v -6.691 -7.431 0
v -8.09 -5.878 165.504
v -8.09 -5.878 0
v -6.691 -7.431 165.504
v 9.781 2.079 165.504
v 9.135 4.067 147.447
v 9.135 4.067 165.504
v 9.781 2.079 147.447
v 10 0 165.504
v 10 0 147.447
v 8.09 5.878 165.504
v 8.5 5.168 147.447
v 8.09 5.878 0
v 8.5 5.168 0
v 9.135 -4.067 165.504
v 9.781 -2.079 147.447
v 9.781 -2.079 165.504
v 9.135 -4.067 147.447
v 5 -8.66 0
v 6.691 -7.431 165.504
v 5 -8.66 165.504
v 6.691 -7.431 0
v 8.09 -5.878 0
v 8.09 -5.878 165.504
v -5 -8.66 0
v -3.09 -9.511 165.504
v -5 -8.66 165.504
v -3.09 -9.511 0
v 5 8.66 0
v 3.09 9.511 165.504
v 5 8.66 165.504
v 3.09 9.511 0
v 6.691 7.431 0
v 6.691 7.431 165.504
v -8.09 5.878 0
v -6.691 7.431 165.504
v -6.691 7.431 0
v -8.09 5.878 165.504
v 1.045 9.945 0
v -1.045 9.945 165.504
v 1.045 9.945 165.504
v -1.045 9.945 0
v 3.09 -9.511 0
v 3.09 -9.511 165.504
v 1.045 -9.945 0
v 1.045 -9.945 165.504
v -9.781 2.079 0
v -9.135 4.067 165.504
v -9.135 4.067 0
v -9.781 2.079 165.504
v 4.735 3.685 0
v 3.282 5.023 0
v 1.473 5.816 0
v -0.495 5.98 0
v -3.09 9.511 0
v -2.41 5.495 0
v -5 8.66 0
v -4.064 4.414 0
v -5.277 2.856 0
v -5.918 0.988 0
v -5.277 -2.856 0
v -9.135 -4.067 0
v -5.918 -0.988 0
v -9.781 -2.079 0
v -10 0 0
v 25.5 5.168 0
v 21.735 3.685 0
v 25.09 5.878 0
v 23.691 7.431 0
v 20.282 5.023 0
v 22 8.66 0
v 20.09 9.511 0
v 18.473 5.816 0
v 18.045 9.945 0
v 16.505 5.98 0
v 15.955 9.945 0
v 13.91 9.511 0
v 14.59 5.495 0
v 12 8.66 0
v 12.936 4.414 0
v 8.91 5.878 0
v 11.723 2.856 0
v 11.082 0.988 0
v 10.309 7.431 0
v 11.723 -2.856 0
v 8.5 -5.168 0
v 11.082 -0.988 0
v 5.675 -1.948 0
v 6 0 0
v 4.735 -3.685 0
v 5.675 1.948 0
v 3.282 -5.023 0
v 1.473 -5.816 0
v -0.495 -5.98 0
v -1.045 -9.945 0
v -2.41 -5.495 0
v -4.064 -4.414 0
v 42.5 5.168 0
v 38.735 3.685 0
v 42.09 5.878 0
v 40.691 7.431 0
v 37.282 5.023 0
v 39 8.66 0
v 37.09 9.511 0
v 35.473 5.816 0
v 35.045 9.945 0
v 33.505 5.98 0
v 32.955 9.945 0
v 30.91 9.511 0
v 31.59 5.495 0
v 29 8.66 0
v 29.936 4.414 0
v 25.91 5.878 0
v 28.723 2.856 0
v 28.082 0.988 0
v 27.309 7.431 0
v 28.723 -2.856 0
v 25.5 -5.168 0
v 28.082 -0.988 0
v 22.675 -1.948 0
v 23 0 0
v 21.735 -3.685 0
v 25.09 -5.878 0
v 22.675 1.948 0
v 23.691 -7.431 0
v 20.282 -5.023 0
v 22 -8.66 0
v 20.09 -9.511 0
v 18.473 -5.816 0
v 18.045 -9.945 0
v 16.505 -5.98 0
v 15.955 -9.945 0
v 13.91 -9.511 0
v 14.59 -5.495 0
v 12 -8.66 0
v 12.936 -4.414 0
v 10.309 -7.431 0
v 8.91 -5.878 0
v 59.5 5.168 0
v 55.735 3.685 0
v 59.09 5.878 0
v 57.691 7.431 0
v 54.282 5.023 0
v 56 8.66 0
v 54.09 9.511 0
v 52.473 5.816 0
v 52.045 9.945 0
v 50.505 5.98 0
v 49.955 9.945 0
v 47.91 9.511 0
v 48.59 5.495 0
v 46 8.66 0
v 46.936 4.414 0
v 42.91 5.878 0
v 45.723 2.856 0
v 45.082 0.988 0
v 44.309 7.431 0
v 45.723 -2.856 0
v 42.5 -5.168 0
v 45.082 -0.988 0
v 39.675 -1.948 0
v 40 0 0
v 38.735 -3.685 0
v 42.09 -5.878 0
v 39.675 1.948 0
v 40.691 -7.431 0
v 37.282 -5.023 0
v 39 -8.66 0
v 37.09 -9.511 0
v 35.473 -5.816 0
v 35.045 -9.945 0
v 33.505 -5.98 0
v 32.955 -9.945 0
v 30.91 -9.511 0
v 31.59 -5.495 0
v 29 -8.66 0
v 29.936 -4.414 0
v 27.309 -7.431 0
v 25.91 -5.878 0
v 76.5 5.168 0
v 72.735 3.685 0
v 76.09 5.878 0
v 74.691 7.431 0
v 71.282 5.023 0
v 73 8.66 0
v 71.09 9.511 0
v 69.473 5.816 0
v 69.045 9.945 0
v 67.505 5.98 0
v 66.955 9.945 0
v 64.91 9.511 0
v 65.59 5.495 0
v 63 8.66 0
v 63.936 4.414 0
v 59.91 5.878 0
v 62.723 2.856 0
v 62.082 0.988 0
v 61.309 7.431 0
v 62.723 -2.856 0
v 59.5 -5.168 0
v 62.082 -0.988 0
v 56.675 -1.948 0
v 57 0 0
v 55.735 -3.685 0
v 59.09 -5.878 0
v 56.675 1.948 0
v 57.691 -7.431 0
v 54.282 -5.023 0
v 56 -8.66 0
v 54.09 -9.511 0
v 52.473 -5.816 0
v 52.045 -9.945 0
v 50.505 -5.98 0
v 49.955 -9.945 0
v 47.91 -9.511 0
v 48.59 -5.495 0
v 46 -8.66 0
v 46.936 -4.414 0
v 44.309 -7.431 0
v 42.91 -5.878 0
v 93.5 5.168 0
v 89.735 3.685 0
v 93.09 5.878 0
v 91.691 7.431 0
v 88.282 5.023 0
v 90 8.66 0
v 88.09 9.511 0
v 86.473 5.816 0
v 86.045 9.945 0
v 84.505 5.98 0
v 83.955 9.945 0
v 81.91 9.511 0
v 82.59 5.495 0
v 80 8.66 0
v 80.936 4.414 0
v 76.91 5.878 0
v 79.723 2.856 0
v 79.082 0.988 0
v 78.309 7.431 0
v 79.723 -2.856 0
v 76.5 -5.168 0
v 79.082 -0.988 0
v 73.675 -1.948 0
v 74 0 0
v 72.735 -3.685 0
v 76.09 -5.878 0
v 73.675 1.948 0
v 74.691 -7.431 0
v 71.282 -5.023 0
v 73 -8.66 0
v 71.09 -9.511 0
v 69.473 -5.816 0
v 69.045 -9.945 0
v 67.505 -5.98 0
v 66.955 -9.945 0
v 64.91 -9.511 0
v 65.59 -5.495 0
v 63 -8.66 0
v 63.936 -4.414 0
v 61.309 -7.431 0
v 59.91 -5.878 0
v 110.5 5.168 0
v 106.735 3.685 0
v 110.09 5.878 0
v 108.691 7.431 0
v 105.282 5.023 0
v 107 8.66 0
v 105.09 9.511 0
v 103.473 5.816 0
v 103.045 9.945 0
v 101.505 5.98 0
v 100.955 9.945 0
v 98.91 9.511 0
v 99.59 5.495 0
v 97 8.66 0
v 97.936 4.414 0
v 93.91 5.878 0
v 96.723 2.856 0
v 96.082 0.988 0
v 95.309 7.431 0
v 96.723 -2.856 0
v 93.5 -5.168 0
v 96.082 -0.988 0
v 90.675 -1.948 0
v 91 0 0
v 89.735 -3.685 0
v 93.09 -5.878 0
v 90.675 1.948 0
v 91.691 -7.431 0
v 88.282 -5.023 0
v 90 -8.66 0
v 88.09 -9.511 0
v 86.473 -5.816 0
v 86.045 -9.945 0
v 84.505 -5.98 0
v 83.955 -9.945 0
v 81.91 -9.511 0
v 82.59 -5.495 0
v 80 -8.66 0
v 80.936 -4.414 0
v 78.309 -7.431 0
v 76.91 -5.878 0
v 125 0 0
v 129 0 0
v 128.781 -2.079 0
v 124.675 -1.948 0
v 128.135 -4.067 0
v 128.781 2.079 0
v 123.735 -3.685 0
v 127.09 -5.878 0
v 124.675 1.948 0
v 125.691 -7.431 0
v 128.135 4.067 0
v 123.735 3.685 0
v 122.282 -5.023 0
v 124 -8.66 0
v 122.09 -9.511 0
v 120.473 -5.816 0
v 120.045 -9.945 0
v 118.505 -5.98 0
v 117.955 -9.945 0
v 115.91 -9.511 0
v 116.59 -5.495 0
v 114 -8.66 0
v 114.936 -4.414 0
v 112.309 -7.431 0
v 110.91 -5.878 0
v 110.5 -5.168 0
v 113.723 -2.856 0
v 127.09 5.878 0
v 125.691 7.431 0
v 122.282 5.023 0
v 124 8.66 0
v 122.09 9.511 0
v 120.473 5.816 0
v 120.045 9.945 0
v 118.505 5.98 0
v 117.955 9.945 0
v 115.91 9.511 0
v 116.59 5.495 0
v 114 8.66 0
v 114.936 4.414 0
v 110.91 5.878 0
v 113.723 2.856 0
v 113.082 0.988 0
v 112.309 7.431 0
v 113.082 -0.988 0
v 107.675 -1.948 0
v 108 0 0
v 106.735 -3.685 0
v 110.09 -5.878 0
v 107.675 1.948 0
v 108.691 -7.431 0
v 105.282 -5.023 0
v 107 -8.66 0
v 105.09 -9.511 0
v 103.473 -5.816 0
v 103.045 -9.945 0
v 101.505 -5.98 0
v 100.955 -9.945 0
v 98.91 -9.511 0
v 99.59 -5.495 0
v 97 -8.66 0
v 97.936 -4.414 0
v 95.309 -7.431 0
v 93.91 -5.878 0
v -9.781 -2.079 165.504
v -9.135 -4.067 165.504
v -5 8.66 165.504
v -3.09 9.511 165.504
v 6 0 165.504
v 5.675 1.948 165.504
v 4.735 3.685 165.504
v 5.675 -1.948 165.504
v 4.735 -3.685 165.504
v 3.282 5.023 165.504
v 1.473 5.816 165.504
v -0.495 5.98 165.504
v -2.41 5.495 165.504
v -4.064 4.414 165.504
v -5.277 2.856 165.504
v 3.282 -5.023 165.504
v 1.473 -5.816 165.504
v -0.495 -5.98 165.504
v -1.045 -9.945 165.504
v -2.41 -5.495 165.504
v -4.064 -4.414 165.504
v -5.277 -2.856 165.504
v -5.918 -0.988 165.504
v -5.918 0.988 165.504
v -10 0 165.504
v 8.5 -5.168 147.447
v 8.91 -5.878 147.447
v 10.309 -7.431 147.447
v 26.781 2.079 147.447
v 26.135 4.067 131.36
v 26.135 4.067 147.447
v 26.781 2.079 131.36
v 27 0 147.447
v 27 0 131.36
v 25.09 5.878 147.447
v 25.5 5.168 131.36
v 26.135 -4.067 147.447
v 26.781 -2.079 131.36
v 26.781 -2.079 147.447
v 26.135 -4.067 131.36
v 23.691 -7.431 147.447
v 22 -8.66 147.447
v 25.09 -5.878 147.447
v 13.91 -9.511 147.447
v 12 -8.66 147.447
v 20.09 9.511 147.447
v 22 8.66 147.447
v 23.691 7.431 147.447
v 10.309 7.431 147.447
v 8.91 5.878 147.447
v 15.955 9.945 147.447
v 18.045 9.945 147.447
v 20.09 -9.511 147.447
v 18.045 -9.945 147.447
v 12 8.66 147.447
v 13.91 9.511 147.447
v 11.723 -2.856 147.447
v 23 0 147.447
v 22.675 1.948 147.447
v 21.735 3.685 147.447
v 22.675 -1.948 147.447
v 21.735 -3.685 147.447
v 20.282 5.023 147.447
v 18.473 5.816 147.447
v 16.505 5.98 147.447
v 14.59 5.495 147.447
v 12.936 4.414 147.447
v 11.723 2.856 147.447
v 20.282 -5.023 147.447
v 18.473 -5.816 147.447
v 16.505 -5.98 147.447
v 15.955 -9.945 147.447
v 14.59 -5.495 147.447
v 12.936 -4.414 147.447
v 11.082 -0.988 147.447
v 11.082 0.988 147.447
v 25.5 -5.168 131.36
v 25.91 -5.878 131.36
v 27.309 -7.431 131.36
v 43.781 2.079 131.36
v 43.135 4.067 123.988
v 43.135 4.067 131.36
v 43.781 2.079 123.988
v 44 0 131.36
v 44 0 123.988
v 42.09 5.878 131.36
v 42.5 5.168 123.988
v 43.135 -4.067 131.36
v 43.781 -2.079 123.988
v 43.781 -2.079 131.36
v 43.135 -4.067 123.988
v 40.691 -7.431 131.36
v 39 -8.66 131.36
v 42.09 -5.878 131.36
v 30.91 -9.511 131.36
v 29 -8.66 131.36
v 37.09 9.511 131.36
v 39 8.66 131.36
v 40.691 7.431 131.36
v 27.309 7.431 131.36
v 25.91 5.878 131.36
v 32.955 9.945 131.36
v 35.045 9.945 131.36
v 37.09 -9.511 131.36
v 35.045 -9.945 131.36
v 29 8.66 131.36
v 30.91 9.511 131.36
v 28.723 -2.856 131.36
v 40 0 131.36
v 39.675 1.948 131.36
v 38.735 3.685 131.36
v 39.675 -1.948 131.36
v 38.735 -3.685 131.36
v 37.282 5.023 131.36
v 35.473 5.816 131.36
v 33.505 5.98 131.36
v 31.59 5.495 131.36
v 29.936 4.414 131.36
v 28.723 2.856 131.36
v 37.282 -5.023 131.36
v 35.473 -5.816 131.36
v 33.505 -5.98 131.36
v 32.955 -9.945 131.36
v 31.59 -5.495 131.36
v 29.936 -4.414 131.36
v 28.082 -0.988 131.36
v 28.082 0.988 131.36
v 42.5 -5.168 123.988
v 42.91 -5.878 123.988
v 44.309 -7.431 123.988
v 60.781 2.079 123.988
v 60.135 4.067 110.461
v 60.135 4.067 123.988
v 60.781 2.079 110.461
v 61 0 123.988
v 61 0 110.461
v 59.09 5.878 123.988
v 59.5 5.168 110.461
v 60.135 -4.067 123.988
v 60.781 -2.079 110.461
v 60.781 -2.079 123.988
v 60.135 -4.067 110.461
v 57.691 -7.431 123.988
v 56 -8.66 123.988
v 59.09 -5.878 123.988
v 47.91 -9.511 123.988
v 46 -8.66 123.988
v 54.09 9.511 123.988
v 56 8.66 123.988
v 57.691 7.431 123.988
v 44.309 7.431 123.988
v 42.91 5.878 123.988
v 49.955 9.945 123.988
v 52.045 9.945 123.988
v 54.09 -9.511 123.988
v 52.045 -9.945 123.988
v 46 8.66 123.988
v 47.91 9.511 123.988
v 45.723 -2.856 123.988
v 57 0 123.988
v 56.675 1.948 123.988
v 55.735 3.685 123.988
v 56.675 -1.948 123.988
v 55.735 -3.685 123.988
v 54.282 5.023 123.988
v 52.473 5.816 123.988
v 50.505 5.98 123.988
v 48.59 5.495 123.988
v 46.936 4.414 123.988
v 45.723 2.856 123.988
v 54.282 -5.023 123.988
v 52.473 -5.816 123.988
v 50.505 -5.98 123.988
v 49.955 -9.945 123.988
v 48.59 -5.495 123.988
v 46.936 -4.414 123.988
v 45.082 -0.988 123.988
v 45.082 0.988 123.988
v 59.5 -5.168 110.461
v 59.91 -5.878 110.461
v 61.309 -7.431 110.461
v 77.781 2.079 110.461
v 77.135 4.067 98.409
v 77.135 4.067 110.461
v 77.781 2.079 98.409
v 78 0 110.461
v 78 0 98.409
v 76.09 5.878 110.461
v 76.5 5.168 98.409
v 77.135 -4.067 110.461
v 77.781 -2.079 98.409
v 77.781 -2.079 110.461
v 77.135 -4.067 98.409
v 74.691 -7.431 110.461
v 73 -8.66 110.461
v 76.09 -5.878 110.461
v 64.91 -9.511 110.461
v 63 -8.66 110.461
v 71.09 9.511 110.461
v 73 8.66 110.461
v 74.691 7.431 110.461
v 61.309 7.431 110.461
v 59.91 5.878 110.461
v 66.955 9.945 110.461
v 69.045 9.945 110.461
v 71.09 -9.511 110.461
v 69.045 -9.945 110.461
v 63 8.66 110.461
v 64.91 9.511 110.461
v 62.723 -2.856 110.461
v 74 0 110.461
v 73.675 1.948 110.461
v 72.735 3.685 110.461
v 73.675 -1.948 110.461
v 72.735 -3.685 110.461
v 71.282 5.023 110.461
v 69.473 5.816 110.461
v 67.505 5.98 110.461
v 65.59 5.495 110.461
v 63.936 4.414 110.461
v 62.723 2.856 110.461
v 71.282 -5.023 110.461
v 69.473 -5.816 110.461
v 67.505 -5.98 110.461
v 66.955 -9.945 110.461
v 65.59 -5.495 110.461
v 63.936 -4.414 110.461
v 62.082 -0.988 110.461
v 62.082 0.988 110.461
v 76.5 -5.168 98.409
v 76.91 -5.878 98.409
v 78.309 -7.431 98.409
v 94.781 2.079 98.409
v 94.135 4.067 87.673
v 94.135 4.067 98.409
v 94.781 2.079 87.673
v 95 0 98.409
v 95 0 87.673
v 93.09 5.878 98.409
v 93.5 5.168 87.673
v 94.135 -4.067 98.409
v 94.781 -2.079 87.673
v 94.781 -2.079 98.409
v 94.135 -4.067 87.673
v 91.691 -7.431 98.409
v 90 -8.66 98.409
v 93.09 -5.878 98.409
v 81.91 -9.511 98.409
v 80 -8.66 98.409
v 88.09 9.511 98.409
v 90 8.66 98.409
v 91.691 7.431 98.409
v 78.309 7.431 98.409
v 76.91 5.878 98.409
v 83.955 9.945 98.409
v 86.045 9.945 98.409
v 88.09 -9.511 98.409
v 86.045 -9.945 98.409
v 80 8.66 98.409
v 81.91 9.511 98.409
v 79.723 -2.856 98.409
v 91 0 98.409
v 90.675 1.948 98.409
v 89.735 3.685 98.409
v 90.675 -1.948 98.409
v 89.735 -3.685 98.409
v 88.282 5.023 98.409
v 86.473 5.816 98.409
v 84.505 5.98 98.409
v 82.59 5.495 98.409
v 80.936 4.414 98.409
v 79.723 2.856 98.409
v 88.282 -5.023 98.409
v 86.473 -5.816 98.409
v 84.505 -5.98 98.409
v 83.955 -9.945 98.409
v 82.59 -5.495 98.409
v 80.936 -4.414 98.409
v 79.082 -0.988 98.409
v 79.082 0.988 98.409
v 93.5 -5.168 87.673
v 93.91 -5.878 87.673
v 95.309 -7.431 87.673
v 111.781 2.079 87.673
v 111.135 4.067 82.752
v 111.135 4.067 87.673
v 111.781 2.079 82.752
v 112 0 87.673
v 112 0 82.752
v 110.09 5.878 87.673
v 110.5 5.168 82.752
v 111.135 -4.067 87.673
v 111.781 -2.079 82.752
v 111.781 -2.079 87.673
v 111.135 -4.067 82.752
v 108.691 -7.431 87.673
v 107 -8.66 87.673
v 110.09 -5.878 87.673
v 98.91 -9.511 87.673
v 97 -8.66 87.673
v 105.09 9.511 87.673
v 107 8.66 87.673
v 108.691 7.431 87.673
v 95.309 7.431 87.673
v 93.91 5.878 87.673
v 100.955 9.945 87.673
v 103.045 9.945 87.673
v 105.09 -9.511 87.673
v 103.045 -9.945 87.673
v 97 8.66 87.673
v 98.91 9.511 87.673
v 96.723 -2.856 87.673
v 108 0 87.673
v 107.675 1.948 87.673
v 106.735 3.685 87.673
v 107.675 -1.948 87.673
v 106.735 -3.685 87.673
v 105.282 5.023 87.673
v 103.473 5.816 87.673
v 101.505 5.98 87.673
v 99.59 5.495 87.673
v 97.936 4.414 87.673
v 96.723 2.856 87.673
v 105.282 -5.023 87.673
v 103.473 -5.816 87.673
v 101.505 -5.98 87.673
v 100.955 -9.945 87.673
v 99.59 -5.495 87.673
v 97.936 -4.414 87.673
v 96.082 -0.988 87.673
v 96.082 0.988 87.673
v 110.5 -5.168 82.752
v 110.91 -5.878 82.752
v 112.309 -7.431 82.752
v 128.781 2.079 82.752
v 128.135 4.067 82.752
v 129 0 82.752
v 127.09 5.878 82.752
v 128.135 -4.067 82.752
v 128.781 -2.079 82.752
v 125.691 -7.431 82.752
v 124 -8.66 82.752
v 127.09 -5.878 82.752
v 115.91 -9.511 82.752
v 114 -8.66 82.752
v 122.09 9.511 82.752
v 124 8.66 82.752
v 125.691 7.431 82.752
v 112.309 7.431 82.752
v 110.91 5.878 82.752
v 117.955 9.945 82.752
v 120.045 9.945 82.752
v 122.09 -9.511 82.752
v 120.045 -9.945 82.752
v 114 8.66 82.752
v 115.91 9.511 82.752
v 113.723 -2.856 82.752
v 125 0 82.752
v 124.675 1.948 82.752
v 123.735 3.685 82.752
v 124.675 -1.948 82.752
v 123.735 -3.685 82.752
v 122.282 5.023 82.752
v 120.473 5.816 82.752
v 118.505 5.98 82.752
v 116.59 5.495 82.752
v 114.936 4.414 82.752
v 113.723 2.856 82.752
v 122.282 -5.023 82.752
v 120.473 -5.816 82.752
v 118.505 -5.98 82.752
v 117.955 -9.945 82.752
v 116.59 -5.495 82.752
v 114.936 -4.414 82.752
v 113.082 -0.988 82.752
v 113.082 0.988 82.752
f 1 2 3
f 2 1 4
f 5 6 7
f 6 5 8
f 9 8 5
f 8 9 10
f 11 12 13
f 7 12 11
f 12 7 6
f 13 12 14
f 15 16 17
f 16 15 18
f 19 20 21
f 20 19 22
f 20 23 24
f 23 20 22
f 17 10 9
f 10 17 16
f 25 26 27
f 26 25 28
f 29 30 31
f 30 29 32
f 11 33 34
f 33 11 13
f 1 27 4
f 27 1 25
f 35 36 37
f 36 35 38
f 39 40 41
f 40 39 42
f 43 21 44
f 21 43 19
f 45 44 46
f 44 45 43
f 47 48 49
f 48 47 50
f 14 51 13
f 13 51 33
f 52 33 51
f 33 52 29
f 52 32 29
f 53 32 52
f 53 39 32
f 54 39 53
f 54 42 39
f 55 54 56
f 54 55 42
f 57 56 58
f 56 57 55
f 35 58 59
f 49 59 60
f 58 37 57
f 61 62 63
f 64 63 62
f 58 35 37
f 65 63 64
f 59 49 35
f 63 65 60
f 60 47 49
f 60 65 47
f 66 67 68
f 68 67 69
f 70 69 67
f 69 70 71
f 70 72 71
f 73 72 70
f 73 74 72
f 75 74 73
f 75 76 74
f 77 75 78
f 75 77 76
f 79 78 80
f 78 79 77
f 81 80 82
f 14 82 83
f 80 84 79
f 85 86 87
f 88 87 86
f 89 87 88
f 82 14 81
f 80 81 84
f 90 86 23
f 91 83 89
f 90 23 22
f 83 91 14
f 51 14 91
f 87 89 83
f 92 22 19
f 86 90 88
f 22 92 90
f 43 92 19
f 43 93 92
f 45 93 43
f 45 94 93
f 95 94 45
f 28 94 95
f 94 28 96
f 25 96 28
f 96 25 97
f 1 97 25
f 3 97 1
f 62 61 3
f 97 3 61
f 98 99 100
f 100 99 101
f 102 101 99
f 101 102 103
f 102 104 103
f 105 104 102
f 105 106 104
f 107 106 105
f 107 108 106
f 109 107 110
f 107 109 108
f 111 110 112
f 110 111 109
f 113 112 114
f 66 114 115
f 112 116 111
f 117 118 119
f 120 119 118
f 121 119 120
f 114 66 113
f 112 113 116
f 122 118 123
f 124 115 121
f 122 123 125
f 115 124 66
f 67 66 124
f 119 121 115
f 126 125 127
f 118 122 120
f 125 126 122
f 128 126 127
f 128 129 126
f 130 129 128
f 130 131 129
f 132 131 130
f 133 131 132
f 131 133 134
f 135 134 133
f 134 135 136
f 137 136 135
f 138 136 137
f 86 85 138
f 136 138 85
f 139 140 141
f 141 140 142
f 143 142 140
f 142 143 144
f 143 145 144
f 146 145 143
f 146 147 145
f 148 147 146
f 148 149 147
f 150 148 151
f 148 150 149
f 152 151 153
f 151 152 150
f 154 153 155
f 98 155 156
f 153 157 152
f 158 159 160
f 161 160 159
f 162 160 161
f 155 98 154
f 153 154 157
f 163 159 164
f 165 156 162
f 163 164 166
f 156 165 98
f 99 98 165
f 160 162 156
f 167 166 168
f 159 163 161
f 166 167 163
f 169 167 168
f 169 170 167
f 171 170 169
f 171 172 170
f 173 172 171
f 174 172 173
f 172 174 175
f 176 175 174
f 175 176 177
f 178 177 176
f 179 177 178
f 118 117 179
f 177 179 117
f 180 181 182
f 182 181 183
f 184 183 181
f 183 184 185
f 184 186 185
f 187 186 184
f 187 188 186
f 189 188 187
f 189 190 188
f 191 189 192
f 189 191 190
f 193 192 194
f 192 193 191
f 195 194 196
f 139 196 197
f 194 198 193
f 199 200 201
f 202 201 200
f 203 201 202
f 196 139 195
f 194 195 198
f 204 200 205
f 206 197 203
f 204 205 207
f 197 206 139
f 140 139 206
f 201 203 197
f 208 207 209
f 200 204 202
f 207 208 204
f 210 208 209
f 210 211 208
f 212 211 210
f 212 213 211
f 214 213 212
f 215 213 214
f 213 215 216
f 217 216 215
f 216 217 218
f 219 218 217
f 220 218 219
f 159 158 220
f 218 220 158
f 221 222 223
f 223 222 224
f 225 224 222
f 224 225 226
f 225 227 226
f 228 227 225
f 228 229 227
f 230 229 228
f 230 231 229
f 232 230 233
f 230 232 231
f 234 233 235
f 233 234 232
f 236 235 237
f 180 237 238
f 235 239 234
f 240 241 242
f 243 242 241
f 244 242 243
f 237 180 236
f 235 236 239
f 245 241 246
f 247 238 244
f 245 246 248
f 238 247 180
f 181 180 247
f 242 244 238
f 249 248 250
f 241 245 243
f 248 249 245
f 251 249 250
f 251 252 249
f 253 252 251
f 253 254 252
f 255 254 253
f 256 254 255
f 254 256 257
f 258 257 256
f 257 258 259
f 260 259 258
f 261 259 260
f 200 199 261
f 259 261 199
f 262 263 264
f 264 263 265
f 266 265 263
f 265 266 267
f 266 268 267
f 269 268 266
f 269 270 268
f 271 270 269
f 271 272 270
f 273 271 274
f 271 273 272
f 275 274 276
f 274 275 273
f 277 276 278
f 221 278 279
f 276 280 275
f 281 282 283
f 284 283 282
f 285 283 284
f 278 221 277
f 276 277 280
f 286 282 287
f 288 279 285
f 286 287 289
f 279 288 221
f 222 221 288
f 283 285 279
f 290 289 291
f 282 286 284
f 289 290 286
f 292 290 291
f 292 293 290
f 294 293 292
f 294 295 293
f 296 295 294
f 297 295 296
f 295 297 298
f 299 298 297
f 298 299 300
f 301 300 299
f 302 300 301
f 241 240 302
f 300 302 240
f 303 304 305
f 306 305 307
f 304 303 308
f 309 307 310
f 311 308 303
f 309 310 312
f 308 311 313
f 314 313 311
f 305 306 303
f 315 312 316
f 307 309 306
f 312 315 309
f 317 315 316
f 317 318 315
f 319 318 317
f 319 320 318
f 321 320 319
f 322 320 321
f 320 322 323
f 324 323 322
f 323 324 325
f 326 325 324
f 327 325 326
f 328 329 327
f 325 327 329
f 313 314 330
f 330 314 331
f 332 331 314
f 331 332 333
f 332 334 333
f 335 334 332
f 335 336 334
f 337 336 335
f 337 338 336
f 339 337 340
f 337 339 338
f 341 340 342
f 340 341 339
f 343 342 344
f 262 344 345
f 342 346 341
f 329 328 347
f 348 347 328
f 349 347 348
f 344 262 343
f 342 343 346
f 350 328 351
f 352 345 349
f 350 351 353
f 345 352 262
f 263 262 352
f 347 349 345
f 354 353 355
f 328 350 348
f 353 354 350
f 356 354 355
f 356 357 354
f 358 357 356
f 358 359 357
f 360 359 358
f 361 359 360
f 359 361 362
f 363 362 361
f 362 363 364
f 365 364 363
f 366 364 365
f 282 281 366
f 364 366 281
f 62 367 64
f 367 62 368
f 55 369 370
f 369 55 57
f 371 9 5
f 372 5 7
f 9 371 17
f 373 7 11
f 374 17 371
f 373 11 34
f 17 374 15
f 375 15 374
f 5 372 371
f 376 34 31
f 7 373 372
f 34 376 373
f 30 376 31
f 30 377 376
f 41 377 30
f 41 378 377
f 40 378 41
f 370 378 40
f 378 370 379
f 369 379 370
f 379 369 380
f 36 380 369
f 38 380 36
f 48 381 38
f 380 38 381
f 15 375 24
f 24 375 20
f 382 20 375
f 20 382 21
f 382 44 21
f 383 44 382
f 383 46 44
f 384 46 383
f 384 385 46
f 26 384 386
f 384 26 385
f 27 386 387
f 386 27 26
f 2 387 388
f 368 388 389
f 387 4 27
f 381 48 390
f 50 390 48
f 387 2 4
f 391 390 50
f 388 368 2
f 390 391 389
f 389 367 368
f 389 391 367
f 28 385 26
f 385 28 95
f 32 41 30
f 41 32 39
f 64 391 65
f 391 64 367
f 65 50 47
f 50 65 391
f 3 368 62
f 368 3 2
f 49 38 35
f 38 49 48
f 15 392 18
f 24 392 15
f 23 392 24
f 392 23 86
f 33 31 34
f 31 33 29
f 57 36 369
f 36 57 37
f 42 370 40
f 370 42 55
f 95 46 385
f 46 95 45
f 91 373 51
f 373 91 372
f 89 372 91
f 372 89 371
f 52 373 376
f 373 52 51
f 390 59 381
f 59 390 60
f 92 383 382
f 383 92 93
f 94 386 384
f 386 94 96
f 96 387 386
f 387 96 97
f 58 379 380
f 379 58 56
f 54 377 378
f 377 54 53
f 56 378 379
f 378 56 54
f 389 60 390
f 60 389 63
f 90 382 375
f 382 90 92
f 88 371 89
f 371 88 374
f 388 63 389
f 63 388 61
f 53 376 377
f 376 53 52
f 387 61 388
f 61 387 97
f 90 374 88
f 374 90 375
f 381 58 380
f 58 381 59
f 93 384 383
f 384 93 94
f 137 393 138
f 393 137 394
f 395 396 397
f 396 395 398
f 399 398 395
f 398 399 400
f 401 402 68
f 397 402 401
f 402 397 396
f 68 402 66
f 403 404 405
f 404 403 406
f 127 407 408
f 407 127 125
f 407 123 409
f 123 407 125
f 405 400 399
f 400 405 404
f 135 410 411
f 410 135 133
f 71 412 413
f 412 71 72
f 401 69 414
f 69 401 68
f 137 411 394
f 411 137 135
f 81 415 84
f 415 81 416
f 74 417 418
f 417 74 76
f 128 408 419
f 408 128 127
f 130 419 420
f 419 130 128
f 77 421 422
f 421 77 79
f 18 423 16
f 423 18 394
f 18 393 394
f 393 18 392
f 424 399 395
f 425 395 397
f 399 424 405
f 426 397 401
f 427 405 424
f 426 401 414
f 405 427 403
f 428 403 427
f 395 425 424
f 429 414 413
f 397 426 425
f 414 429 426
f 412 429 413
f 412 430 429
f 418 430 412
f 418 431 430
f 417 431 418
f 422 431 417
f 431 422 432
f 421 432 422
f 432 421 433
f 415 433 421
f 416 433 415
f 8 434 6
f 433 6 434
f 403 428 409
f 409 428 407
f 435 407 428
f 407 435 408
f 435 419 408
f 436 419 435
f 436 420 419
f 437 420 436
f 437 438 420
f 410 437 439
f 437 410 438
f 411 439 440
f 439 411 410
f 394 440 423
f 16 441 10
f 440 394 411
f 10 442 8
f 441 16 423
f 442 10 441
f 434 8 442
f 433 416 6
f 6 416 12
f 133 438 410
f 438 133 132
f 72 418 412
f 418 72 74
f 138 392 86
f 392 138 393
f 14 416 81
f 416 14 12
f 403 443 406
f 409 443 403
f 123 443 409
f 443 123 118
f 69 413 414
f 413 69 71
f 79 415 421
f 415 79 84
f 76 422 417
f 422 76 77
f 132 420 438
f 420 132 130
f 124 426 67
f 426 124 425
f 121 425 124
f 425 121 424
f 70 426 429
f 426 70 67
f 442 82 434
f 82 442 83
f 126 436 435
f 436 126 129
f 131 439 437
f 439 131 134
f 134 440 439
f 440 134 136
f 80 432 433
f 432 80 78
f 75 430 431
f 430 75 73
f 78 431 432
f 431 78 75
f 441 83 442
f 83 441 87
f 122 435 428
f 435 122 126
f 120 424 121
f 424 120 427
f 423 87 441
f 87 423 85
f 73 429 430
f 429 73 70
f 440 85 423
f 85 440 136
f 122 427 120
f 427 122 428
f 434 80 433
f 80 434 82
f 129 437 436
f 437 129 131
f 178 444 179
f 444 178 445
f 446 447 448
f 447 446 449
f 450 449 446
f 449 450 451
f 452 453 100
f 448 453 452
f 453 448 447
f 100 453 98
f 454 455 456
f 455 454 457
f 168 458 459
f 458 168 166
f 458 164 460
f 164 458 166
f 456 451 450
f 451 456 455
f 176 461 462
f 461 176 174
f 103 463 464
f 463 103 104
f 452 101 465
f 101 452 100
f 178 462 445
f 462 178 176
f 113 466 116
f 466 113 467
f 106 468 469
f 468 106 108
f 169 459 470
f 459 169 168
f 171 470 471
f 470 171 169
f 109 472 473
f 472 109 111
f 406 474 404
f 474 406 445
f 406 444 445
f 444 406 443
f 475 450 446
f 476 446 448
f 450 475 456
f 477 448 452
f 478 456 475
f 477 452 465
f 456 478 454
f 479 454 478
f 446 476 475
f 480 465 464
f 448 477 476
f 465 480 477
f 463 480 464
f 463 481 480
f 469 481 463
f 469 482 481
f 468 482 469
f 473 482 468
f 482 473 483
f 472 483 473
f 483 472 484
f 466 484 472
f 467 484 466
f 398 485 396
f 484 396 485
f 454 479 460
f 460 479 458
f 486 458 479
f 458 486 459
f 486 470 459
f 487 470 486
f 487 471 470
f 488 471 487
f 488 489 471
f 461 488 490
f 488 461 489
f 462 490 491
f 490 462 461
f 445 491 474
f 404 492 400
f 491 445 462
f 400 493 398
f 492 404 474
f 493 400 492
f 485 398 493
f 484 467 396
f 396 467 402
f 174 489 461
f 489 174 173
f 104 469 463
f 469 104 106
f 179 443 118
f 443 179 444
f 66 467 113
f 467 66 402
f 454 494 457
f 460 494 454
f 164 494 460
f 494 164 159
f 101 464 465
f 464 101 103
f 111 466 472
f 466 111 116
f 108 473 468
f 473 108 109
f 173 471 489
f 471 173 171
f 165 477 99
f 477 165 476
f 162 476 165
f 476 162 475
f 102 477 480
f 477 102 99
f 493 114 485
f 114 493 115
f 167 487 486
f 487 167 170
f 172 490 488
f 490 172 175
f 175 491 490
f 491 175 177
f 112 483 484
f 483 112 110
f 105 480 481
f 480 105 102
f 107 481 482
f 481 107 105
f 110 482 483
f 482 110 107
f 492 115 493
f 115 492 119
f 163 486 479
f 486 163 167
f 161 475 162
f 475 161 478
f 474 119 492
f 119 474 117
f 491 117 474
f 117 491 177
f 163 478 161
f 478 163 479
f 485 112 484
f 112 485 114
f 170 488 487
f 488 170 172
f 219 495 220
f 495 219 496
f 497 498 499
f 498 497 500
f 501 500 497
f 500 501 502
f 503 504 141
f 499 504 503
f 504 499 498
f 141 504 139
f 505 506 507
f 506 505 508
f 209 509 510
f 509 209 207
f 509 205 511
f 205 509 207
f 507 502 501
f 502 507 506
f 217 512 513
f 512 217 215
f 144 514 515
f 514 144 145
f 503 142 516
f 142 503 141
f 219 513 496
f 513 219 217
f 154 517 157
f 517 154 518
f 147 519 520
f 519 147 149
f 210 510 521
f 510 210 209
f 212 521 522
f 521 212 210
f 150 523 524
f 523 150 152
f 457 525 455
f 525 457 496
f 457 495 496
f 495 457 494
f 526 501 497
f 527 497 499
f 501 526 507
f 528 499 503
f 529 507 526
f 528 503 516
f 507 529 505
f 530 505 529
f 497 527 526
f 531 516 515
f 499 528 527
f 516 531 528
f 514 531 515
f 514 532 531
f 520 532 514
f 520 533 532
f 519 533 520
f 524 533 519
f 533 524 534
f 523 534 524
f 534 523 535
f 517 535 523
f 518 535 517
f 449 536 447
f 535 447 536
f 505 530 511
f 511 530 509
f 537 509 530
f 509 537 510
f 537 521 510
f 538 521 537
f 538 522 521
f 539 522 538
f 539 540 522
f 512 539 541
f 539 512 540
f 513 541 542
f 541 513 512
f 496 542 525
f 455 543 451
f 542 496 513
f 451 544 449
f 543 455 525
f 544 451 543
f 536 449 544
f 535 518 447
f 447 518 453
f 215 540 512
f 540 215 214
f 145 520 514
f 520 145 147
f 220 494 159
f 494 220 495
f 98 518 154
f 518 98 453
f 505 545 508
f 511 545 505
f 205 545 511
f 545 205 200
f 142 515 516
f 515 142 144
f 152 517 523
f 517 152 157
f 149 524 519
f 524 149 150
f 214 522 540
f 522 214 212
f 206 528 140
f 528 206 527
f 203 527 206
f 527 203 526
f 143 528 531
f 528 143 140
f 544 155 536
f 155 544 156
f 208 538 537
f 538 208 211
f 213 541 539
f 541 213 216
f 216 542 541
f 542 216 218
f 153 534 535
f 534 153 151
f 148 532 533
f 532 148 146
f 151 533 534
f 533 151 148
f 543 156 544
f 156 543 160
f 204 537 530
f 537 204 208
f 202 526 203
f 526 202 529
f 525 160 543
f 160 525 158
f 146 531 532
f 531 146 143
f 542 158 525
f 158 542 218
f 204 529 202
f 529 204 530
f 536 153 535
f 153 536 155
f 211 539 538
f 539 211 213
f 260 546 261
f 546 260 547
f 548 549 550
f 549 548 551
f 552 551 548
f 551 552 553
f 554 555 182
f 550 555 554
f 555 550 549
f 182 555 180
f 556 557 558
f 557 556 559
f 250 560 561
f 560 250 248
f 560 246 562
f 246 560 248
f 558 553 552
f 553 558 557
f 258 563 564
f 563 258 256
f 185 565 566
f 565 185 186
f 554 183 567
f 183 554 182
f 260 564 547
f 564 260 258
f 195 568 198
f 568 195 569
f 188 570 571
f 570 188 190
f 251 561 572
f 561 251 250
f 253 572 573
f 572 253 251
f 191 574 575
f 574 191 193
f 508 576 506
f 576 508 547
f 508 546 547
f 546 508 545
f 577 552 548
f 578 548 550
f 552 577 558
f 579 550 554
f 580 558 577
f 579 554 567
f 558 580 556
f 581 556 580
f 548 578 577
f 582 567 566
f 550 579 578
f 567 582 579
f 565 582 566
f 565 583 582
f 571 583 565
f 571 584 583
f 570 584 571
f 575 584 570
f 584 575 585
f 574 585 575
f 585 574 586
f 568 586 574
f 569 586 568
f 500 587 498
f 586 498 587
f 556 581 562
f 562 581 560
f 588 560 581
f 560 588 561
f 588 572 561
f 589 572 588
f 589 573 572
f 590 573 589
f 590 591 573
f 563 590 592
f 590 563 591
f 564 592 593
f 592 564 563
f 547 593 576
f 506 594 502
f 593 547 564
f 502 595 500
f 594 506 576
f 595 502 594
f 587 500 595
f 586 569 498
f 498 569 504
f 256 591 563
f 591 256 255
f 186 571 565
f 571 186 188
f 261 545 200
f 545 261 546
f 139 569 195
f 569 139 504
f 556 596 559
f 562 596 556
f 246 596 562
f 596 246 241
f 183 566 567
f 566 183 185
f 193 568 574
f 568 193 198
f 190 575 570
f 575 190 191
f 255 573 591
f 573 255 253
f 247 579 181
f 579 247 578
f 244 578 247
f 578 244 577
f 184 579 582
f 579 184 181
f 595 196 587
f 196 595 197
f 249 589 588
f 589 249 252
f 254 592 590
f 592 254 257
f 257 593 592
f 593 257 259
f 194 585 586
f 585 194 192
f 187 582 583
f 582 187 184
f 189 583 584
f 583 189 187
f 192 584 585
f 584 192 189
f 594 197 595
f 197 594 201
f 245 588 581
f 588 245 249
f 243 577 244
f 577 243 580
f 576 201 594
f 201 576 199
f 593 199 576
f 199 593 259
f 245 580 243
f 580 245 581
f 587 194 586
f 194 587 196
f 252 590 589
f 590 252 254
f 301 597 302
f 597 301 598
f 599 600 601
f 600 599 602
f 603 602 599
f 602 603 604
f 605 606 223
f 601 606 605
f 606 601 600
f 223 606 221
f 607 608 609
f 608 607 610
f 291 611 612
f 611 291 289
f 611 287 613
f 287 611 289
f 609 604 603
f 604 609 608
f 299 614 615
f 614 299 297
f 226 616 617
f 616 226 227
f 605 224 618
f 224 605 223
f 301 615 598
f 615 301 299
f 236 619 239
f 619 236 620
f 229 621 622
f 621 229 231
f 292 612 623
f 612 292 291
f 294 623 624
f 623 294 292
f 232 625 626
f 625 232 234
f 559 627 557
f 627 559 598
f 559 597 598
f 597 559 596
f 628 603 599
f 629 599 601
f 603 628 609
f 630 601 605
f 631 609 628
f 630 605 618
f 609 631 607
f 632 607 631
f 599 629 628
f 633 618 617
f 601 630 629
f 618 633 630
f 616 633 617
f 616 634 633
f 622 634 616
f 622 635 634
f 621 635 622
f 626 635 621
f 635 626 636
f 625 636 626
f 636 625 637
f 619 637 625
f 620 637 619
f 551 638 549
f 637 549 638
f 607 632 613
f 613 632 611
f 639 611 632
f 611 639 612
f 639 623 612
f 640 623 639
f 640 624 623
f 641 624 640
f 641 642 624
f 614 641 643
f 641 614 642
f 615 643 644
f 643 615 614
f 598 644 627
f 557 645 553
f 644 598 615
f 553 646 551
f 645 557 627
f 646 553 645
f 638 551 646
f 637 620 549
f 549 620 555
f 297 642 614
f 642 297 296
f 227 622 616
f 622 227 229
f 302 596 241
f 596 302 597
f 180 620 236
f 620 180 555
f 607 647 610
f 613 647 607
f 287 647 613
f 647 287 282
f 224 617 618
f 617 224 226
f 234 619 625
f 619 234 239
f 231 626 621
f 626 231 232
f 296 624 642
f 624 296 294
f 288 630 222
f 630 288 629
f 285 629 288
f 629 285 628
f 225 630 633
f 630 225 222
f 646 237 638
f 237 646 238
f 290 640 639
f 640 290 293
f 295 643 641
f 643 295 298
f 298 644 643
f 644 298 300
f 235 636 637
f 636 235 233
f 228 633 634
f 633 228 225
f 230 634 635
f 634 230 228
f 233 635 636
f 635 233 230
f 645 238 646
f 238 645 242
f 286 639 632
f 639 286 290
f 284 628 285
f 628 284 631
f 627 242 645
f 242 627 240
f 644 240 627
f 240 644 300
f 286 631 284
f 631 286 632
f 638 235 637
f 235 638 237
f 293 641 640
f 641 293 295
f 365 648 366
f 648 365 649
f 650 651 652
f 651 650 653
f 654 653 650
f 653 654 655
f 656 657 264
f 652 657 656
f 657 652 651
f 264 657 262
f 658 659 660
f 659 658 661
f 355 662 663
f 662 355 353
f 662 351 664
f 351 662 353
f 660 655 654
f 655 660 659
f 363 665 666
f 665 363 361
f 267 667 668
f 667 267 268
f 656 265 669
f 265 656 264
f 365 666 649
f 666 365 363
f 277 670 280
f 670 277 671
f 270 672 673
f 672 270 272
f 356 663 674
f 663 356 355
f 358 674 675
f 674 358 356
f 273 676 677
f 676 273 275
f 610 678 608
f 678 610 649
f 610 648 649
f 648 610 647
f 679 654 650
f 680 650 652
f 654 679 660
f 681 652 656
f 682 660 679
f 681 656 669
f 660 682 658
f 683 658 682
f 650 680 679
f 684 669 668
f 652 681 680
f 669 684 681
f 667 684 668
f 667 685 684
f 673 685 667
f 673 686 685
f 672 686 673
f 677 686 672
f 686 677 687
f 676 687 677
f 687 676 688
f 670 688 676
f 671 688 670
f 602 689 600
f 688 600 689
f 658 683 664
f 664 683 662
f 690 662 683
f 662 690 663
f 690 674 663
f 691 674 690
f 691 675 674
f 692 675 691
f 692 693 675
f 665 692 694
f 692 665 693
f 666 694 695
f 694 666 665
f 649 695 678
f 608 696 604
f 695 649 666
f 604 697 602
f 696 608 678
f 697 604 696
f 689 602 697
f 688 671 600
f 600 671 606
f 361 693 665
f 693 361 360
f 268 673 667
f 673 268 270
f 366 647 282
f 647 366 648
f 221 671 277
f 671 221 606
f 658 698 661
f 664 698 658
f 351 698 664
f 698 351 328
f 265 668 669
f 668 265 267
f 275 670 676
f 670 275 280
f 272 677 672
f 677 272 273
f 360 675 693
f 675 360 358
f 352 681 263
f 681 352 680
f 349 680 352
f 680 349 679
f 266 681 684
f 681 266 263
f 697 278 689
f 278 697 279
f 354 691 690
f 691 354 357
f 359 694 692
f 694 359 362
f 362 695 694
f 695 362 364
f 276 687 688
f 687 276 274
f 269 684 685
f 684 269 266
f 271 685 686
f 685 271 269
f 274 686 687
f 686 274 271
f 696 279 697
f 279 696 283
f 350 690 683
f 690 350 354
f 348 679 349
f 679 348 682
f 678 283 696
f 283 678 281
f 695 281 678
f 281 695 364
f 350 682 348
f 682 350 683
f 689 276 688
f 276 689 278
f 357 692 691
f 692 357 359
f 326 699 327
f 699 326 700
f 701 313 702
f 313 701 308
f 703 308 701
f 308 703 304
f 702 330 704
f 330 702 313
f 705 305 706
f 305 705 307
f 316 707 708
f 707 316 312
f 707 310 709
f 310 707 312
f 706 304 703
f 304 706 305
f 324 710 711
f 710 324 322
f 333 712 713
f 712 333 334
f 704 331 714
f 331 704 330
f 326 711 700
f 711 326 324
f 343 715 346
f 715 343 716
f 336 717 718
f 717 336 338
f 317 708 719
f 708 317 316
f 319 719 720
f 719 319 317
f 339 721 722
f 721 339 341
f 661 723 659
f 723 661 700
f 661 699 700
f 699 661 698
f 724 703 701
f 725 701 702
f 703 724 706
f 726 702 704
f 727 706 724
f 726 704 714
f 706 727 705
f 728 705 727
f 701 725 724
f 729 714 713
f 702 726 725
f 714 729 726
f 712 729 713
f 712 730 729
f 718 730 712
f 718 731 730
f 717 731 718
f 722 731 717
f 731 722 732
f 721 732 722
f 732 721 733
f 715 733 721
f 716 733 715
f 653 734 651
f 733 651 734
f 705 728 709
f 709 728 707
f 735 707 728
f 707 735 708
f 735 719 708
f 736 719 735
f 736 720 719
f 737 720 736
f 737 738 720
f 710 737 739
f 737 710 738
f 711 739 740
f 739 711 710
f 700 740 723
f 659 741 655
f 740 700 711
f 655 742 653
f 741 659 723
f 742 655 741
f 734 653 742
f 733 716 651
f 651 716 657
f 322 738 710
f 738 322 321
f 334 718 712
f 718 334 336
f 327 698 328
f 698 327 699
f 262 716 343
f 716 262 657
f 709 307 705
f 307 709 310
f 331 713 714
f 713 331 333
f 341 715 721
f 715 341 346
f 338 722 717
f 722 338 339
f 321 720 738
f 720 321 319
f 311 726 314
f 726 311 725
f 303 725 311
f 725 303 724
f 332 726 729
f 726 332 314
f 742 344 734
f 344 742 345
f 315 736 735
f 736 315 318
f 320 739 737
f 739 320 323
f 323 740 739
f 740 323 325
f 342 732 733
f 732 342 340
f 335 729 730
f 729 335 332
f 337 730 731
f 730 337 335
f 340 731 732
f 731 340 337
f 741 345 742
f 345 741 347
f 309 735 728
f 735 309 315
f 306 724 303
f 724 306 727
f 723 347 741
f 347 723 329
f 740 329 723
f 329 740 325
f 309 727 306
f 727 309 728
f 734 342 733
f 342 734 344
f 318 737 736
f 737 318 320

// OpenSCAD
union(){
    translate(v=[0.0, 0, 0]){
        difference(){
            cylinder(h=165.504, r=10);
            translate(v=[0, 0, -0.001]){
                cylinder(h=165.506, r=6);
            };
        };
    };
    translate(v=[17.0, 0, 0]){
        difference(){
            cylinder(h=147.447, r=10);
            translate(v=[0, 0, -0.001]){
                cylinder(h=147.449, r=6);
            };
        };
    };
    translate(v=[34.0, 0, 0]){
        difference(){
            cylinder(h=131.35999999999999, r=10);
            translate(v=[0, 0, -0.001]){
                cylinder(h=131.362, r=6);
            };
        };
    };
    translate(v=[51.0, 0, 0]){
        difference(){
            cylinder(h=123.988, r=10);
            translate(v=[0, 0, -0.001]){
                cylinder(h=123.99, r=6);
            };
        };
    };
    translate(v=[68.0, 0, 0]){
        difference(){
            cylinder(h=110.46099999999998, r=10);
            translate(v=[0, 0, -0.001]){
                cylinder(h=110.46299999999998, r=6);
            };
        };
    };
    translate(v=[85.0, 0, 0]){
        difference(){
            cylinder(h=98.40899999999999, r=10);
            translate(v=[0, 0, -0.001]){
                cylinder(h=98.41099999999999, r=6);
            };
        };
    };
    translate(v=[102.0, 0, 0]){
        difference(){
            cylinder(h=87.673, r=10);
            translate(v=[0, 0, -0.001]){
                cylinder(h=87.675, r=6);
            };
        };
    };
    translate(v=[119.0, 0, 0]){
        difference(){
            cylinder(h=82.752, r=10);
            translate(v=[0, 0, -0.001]){
                cylinder(h=82.75399999999999, r=6);
            };
        };
    };
};
